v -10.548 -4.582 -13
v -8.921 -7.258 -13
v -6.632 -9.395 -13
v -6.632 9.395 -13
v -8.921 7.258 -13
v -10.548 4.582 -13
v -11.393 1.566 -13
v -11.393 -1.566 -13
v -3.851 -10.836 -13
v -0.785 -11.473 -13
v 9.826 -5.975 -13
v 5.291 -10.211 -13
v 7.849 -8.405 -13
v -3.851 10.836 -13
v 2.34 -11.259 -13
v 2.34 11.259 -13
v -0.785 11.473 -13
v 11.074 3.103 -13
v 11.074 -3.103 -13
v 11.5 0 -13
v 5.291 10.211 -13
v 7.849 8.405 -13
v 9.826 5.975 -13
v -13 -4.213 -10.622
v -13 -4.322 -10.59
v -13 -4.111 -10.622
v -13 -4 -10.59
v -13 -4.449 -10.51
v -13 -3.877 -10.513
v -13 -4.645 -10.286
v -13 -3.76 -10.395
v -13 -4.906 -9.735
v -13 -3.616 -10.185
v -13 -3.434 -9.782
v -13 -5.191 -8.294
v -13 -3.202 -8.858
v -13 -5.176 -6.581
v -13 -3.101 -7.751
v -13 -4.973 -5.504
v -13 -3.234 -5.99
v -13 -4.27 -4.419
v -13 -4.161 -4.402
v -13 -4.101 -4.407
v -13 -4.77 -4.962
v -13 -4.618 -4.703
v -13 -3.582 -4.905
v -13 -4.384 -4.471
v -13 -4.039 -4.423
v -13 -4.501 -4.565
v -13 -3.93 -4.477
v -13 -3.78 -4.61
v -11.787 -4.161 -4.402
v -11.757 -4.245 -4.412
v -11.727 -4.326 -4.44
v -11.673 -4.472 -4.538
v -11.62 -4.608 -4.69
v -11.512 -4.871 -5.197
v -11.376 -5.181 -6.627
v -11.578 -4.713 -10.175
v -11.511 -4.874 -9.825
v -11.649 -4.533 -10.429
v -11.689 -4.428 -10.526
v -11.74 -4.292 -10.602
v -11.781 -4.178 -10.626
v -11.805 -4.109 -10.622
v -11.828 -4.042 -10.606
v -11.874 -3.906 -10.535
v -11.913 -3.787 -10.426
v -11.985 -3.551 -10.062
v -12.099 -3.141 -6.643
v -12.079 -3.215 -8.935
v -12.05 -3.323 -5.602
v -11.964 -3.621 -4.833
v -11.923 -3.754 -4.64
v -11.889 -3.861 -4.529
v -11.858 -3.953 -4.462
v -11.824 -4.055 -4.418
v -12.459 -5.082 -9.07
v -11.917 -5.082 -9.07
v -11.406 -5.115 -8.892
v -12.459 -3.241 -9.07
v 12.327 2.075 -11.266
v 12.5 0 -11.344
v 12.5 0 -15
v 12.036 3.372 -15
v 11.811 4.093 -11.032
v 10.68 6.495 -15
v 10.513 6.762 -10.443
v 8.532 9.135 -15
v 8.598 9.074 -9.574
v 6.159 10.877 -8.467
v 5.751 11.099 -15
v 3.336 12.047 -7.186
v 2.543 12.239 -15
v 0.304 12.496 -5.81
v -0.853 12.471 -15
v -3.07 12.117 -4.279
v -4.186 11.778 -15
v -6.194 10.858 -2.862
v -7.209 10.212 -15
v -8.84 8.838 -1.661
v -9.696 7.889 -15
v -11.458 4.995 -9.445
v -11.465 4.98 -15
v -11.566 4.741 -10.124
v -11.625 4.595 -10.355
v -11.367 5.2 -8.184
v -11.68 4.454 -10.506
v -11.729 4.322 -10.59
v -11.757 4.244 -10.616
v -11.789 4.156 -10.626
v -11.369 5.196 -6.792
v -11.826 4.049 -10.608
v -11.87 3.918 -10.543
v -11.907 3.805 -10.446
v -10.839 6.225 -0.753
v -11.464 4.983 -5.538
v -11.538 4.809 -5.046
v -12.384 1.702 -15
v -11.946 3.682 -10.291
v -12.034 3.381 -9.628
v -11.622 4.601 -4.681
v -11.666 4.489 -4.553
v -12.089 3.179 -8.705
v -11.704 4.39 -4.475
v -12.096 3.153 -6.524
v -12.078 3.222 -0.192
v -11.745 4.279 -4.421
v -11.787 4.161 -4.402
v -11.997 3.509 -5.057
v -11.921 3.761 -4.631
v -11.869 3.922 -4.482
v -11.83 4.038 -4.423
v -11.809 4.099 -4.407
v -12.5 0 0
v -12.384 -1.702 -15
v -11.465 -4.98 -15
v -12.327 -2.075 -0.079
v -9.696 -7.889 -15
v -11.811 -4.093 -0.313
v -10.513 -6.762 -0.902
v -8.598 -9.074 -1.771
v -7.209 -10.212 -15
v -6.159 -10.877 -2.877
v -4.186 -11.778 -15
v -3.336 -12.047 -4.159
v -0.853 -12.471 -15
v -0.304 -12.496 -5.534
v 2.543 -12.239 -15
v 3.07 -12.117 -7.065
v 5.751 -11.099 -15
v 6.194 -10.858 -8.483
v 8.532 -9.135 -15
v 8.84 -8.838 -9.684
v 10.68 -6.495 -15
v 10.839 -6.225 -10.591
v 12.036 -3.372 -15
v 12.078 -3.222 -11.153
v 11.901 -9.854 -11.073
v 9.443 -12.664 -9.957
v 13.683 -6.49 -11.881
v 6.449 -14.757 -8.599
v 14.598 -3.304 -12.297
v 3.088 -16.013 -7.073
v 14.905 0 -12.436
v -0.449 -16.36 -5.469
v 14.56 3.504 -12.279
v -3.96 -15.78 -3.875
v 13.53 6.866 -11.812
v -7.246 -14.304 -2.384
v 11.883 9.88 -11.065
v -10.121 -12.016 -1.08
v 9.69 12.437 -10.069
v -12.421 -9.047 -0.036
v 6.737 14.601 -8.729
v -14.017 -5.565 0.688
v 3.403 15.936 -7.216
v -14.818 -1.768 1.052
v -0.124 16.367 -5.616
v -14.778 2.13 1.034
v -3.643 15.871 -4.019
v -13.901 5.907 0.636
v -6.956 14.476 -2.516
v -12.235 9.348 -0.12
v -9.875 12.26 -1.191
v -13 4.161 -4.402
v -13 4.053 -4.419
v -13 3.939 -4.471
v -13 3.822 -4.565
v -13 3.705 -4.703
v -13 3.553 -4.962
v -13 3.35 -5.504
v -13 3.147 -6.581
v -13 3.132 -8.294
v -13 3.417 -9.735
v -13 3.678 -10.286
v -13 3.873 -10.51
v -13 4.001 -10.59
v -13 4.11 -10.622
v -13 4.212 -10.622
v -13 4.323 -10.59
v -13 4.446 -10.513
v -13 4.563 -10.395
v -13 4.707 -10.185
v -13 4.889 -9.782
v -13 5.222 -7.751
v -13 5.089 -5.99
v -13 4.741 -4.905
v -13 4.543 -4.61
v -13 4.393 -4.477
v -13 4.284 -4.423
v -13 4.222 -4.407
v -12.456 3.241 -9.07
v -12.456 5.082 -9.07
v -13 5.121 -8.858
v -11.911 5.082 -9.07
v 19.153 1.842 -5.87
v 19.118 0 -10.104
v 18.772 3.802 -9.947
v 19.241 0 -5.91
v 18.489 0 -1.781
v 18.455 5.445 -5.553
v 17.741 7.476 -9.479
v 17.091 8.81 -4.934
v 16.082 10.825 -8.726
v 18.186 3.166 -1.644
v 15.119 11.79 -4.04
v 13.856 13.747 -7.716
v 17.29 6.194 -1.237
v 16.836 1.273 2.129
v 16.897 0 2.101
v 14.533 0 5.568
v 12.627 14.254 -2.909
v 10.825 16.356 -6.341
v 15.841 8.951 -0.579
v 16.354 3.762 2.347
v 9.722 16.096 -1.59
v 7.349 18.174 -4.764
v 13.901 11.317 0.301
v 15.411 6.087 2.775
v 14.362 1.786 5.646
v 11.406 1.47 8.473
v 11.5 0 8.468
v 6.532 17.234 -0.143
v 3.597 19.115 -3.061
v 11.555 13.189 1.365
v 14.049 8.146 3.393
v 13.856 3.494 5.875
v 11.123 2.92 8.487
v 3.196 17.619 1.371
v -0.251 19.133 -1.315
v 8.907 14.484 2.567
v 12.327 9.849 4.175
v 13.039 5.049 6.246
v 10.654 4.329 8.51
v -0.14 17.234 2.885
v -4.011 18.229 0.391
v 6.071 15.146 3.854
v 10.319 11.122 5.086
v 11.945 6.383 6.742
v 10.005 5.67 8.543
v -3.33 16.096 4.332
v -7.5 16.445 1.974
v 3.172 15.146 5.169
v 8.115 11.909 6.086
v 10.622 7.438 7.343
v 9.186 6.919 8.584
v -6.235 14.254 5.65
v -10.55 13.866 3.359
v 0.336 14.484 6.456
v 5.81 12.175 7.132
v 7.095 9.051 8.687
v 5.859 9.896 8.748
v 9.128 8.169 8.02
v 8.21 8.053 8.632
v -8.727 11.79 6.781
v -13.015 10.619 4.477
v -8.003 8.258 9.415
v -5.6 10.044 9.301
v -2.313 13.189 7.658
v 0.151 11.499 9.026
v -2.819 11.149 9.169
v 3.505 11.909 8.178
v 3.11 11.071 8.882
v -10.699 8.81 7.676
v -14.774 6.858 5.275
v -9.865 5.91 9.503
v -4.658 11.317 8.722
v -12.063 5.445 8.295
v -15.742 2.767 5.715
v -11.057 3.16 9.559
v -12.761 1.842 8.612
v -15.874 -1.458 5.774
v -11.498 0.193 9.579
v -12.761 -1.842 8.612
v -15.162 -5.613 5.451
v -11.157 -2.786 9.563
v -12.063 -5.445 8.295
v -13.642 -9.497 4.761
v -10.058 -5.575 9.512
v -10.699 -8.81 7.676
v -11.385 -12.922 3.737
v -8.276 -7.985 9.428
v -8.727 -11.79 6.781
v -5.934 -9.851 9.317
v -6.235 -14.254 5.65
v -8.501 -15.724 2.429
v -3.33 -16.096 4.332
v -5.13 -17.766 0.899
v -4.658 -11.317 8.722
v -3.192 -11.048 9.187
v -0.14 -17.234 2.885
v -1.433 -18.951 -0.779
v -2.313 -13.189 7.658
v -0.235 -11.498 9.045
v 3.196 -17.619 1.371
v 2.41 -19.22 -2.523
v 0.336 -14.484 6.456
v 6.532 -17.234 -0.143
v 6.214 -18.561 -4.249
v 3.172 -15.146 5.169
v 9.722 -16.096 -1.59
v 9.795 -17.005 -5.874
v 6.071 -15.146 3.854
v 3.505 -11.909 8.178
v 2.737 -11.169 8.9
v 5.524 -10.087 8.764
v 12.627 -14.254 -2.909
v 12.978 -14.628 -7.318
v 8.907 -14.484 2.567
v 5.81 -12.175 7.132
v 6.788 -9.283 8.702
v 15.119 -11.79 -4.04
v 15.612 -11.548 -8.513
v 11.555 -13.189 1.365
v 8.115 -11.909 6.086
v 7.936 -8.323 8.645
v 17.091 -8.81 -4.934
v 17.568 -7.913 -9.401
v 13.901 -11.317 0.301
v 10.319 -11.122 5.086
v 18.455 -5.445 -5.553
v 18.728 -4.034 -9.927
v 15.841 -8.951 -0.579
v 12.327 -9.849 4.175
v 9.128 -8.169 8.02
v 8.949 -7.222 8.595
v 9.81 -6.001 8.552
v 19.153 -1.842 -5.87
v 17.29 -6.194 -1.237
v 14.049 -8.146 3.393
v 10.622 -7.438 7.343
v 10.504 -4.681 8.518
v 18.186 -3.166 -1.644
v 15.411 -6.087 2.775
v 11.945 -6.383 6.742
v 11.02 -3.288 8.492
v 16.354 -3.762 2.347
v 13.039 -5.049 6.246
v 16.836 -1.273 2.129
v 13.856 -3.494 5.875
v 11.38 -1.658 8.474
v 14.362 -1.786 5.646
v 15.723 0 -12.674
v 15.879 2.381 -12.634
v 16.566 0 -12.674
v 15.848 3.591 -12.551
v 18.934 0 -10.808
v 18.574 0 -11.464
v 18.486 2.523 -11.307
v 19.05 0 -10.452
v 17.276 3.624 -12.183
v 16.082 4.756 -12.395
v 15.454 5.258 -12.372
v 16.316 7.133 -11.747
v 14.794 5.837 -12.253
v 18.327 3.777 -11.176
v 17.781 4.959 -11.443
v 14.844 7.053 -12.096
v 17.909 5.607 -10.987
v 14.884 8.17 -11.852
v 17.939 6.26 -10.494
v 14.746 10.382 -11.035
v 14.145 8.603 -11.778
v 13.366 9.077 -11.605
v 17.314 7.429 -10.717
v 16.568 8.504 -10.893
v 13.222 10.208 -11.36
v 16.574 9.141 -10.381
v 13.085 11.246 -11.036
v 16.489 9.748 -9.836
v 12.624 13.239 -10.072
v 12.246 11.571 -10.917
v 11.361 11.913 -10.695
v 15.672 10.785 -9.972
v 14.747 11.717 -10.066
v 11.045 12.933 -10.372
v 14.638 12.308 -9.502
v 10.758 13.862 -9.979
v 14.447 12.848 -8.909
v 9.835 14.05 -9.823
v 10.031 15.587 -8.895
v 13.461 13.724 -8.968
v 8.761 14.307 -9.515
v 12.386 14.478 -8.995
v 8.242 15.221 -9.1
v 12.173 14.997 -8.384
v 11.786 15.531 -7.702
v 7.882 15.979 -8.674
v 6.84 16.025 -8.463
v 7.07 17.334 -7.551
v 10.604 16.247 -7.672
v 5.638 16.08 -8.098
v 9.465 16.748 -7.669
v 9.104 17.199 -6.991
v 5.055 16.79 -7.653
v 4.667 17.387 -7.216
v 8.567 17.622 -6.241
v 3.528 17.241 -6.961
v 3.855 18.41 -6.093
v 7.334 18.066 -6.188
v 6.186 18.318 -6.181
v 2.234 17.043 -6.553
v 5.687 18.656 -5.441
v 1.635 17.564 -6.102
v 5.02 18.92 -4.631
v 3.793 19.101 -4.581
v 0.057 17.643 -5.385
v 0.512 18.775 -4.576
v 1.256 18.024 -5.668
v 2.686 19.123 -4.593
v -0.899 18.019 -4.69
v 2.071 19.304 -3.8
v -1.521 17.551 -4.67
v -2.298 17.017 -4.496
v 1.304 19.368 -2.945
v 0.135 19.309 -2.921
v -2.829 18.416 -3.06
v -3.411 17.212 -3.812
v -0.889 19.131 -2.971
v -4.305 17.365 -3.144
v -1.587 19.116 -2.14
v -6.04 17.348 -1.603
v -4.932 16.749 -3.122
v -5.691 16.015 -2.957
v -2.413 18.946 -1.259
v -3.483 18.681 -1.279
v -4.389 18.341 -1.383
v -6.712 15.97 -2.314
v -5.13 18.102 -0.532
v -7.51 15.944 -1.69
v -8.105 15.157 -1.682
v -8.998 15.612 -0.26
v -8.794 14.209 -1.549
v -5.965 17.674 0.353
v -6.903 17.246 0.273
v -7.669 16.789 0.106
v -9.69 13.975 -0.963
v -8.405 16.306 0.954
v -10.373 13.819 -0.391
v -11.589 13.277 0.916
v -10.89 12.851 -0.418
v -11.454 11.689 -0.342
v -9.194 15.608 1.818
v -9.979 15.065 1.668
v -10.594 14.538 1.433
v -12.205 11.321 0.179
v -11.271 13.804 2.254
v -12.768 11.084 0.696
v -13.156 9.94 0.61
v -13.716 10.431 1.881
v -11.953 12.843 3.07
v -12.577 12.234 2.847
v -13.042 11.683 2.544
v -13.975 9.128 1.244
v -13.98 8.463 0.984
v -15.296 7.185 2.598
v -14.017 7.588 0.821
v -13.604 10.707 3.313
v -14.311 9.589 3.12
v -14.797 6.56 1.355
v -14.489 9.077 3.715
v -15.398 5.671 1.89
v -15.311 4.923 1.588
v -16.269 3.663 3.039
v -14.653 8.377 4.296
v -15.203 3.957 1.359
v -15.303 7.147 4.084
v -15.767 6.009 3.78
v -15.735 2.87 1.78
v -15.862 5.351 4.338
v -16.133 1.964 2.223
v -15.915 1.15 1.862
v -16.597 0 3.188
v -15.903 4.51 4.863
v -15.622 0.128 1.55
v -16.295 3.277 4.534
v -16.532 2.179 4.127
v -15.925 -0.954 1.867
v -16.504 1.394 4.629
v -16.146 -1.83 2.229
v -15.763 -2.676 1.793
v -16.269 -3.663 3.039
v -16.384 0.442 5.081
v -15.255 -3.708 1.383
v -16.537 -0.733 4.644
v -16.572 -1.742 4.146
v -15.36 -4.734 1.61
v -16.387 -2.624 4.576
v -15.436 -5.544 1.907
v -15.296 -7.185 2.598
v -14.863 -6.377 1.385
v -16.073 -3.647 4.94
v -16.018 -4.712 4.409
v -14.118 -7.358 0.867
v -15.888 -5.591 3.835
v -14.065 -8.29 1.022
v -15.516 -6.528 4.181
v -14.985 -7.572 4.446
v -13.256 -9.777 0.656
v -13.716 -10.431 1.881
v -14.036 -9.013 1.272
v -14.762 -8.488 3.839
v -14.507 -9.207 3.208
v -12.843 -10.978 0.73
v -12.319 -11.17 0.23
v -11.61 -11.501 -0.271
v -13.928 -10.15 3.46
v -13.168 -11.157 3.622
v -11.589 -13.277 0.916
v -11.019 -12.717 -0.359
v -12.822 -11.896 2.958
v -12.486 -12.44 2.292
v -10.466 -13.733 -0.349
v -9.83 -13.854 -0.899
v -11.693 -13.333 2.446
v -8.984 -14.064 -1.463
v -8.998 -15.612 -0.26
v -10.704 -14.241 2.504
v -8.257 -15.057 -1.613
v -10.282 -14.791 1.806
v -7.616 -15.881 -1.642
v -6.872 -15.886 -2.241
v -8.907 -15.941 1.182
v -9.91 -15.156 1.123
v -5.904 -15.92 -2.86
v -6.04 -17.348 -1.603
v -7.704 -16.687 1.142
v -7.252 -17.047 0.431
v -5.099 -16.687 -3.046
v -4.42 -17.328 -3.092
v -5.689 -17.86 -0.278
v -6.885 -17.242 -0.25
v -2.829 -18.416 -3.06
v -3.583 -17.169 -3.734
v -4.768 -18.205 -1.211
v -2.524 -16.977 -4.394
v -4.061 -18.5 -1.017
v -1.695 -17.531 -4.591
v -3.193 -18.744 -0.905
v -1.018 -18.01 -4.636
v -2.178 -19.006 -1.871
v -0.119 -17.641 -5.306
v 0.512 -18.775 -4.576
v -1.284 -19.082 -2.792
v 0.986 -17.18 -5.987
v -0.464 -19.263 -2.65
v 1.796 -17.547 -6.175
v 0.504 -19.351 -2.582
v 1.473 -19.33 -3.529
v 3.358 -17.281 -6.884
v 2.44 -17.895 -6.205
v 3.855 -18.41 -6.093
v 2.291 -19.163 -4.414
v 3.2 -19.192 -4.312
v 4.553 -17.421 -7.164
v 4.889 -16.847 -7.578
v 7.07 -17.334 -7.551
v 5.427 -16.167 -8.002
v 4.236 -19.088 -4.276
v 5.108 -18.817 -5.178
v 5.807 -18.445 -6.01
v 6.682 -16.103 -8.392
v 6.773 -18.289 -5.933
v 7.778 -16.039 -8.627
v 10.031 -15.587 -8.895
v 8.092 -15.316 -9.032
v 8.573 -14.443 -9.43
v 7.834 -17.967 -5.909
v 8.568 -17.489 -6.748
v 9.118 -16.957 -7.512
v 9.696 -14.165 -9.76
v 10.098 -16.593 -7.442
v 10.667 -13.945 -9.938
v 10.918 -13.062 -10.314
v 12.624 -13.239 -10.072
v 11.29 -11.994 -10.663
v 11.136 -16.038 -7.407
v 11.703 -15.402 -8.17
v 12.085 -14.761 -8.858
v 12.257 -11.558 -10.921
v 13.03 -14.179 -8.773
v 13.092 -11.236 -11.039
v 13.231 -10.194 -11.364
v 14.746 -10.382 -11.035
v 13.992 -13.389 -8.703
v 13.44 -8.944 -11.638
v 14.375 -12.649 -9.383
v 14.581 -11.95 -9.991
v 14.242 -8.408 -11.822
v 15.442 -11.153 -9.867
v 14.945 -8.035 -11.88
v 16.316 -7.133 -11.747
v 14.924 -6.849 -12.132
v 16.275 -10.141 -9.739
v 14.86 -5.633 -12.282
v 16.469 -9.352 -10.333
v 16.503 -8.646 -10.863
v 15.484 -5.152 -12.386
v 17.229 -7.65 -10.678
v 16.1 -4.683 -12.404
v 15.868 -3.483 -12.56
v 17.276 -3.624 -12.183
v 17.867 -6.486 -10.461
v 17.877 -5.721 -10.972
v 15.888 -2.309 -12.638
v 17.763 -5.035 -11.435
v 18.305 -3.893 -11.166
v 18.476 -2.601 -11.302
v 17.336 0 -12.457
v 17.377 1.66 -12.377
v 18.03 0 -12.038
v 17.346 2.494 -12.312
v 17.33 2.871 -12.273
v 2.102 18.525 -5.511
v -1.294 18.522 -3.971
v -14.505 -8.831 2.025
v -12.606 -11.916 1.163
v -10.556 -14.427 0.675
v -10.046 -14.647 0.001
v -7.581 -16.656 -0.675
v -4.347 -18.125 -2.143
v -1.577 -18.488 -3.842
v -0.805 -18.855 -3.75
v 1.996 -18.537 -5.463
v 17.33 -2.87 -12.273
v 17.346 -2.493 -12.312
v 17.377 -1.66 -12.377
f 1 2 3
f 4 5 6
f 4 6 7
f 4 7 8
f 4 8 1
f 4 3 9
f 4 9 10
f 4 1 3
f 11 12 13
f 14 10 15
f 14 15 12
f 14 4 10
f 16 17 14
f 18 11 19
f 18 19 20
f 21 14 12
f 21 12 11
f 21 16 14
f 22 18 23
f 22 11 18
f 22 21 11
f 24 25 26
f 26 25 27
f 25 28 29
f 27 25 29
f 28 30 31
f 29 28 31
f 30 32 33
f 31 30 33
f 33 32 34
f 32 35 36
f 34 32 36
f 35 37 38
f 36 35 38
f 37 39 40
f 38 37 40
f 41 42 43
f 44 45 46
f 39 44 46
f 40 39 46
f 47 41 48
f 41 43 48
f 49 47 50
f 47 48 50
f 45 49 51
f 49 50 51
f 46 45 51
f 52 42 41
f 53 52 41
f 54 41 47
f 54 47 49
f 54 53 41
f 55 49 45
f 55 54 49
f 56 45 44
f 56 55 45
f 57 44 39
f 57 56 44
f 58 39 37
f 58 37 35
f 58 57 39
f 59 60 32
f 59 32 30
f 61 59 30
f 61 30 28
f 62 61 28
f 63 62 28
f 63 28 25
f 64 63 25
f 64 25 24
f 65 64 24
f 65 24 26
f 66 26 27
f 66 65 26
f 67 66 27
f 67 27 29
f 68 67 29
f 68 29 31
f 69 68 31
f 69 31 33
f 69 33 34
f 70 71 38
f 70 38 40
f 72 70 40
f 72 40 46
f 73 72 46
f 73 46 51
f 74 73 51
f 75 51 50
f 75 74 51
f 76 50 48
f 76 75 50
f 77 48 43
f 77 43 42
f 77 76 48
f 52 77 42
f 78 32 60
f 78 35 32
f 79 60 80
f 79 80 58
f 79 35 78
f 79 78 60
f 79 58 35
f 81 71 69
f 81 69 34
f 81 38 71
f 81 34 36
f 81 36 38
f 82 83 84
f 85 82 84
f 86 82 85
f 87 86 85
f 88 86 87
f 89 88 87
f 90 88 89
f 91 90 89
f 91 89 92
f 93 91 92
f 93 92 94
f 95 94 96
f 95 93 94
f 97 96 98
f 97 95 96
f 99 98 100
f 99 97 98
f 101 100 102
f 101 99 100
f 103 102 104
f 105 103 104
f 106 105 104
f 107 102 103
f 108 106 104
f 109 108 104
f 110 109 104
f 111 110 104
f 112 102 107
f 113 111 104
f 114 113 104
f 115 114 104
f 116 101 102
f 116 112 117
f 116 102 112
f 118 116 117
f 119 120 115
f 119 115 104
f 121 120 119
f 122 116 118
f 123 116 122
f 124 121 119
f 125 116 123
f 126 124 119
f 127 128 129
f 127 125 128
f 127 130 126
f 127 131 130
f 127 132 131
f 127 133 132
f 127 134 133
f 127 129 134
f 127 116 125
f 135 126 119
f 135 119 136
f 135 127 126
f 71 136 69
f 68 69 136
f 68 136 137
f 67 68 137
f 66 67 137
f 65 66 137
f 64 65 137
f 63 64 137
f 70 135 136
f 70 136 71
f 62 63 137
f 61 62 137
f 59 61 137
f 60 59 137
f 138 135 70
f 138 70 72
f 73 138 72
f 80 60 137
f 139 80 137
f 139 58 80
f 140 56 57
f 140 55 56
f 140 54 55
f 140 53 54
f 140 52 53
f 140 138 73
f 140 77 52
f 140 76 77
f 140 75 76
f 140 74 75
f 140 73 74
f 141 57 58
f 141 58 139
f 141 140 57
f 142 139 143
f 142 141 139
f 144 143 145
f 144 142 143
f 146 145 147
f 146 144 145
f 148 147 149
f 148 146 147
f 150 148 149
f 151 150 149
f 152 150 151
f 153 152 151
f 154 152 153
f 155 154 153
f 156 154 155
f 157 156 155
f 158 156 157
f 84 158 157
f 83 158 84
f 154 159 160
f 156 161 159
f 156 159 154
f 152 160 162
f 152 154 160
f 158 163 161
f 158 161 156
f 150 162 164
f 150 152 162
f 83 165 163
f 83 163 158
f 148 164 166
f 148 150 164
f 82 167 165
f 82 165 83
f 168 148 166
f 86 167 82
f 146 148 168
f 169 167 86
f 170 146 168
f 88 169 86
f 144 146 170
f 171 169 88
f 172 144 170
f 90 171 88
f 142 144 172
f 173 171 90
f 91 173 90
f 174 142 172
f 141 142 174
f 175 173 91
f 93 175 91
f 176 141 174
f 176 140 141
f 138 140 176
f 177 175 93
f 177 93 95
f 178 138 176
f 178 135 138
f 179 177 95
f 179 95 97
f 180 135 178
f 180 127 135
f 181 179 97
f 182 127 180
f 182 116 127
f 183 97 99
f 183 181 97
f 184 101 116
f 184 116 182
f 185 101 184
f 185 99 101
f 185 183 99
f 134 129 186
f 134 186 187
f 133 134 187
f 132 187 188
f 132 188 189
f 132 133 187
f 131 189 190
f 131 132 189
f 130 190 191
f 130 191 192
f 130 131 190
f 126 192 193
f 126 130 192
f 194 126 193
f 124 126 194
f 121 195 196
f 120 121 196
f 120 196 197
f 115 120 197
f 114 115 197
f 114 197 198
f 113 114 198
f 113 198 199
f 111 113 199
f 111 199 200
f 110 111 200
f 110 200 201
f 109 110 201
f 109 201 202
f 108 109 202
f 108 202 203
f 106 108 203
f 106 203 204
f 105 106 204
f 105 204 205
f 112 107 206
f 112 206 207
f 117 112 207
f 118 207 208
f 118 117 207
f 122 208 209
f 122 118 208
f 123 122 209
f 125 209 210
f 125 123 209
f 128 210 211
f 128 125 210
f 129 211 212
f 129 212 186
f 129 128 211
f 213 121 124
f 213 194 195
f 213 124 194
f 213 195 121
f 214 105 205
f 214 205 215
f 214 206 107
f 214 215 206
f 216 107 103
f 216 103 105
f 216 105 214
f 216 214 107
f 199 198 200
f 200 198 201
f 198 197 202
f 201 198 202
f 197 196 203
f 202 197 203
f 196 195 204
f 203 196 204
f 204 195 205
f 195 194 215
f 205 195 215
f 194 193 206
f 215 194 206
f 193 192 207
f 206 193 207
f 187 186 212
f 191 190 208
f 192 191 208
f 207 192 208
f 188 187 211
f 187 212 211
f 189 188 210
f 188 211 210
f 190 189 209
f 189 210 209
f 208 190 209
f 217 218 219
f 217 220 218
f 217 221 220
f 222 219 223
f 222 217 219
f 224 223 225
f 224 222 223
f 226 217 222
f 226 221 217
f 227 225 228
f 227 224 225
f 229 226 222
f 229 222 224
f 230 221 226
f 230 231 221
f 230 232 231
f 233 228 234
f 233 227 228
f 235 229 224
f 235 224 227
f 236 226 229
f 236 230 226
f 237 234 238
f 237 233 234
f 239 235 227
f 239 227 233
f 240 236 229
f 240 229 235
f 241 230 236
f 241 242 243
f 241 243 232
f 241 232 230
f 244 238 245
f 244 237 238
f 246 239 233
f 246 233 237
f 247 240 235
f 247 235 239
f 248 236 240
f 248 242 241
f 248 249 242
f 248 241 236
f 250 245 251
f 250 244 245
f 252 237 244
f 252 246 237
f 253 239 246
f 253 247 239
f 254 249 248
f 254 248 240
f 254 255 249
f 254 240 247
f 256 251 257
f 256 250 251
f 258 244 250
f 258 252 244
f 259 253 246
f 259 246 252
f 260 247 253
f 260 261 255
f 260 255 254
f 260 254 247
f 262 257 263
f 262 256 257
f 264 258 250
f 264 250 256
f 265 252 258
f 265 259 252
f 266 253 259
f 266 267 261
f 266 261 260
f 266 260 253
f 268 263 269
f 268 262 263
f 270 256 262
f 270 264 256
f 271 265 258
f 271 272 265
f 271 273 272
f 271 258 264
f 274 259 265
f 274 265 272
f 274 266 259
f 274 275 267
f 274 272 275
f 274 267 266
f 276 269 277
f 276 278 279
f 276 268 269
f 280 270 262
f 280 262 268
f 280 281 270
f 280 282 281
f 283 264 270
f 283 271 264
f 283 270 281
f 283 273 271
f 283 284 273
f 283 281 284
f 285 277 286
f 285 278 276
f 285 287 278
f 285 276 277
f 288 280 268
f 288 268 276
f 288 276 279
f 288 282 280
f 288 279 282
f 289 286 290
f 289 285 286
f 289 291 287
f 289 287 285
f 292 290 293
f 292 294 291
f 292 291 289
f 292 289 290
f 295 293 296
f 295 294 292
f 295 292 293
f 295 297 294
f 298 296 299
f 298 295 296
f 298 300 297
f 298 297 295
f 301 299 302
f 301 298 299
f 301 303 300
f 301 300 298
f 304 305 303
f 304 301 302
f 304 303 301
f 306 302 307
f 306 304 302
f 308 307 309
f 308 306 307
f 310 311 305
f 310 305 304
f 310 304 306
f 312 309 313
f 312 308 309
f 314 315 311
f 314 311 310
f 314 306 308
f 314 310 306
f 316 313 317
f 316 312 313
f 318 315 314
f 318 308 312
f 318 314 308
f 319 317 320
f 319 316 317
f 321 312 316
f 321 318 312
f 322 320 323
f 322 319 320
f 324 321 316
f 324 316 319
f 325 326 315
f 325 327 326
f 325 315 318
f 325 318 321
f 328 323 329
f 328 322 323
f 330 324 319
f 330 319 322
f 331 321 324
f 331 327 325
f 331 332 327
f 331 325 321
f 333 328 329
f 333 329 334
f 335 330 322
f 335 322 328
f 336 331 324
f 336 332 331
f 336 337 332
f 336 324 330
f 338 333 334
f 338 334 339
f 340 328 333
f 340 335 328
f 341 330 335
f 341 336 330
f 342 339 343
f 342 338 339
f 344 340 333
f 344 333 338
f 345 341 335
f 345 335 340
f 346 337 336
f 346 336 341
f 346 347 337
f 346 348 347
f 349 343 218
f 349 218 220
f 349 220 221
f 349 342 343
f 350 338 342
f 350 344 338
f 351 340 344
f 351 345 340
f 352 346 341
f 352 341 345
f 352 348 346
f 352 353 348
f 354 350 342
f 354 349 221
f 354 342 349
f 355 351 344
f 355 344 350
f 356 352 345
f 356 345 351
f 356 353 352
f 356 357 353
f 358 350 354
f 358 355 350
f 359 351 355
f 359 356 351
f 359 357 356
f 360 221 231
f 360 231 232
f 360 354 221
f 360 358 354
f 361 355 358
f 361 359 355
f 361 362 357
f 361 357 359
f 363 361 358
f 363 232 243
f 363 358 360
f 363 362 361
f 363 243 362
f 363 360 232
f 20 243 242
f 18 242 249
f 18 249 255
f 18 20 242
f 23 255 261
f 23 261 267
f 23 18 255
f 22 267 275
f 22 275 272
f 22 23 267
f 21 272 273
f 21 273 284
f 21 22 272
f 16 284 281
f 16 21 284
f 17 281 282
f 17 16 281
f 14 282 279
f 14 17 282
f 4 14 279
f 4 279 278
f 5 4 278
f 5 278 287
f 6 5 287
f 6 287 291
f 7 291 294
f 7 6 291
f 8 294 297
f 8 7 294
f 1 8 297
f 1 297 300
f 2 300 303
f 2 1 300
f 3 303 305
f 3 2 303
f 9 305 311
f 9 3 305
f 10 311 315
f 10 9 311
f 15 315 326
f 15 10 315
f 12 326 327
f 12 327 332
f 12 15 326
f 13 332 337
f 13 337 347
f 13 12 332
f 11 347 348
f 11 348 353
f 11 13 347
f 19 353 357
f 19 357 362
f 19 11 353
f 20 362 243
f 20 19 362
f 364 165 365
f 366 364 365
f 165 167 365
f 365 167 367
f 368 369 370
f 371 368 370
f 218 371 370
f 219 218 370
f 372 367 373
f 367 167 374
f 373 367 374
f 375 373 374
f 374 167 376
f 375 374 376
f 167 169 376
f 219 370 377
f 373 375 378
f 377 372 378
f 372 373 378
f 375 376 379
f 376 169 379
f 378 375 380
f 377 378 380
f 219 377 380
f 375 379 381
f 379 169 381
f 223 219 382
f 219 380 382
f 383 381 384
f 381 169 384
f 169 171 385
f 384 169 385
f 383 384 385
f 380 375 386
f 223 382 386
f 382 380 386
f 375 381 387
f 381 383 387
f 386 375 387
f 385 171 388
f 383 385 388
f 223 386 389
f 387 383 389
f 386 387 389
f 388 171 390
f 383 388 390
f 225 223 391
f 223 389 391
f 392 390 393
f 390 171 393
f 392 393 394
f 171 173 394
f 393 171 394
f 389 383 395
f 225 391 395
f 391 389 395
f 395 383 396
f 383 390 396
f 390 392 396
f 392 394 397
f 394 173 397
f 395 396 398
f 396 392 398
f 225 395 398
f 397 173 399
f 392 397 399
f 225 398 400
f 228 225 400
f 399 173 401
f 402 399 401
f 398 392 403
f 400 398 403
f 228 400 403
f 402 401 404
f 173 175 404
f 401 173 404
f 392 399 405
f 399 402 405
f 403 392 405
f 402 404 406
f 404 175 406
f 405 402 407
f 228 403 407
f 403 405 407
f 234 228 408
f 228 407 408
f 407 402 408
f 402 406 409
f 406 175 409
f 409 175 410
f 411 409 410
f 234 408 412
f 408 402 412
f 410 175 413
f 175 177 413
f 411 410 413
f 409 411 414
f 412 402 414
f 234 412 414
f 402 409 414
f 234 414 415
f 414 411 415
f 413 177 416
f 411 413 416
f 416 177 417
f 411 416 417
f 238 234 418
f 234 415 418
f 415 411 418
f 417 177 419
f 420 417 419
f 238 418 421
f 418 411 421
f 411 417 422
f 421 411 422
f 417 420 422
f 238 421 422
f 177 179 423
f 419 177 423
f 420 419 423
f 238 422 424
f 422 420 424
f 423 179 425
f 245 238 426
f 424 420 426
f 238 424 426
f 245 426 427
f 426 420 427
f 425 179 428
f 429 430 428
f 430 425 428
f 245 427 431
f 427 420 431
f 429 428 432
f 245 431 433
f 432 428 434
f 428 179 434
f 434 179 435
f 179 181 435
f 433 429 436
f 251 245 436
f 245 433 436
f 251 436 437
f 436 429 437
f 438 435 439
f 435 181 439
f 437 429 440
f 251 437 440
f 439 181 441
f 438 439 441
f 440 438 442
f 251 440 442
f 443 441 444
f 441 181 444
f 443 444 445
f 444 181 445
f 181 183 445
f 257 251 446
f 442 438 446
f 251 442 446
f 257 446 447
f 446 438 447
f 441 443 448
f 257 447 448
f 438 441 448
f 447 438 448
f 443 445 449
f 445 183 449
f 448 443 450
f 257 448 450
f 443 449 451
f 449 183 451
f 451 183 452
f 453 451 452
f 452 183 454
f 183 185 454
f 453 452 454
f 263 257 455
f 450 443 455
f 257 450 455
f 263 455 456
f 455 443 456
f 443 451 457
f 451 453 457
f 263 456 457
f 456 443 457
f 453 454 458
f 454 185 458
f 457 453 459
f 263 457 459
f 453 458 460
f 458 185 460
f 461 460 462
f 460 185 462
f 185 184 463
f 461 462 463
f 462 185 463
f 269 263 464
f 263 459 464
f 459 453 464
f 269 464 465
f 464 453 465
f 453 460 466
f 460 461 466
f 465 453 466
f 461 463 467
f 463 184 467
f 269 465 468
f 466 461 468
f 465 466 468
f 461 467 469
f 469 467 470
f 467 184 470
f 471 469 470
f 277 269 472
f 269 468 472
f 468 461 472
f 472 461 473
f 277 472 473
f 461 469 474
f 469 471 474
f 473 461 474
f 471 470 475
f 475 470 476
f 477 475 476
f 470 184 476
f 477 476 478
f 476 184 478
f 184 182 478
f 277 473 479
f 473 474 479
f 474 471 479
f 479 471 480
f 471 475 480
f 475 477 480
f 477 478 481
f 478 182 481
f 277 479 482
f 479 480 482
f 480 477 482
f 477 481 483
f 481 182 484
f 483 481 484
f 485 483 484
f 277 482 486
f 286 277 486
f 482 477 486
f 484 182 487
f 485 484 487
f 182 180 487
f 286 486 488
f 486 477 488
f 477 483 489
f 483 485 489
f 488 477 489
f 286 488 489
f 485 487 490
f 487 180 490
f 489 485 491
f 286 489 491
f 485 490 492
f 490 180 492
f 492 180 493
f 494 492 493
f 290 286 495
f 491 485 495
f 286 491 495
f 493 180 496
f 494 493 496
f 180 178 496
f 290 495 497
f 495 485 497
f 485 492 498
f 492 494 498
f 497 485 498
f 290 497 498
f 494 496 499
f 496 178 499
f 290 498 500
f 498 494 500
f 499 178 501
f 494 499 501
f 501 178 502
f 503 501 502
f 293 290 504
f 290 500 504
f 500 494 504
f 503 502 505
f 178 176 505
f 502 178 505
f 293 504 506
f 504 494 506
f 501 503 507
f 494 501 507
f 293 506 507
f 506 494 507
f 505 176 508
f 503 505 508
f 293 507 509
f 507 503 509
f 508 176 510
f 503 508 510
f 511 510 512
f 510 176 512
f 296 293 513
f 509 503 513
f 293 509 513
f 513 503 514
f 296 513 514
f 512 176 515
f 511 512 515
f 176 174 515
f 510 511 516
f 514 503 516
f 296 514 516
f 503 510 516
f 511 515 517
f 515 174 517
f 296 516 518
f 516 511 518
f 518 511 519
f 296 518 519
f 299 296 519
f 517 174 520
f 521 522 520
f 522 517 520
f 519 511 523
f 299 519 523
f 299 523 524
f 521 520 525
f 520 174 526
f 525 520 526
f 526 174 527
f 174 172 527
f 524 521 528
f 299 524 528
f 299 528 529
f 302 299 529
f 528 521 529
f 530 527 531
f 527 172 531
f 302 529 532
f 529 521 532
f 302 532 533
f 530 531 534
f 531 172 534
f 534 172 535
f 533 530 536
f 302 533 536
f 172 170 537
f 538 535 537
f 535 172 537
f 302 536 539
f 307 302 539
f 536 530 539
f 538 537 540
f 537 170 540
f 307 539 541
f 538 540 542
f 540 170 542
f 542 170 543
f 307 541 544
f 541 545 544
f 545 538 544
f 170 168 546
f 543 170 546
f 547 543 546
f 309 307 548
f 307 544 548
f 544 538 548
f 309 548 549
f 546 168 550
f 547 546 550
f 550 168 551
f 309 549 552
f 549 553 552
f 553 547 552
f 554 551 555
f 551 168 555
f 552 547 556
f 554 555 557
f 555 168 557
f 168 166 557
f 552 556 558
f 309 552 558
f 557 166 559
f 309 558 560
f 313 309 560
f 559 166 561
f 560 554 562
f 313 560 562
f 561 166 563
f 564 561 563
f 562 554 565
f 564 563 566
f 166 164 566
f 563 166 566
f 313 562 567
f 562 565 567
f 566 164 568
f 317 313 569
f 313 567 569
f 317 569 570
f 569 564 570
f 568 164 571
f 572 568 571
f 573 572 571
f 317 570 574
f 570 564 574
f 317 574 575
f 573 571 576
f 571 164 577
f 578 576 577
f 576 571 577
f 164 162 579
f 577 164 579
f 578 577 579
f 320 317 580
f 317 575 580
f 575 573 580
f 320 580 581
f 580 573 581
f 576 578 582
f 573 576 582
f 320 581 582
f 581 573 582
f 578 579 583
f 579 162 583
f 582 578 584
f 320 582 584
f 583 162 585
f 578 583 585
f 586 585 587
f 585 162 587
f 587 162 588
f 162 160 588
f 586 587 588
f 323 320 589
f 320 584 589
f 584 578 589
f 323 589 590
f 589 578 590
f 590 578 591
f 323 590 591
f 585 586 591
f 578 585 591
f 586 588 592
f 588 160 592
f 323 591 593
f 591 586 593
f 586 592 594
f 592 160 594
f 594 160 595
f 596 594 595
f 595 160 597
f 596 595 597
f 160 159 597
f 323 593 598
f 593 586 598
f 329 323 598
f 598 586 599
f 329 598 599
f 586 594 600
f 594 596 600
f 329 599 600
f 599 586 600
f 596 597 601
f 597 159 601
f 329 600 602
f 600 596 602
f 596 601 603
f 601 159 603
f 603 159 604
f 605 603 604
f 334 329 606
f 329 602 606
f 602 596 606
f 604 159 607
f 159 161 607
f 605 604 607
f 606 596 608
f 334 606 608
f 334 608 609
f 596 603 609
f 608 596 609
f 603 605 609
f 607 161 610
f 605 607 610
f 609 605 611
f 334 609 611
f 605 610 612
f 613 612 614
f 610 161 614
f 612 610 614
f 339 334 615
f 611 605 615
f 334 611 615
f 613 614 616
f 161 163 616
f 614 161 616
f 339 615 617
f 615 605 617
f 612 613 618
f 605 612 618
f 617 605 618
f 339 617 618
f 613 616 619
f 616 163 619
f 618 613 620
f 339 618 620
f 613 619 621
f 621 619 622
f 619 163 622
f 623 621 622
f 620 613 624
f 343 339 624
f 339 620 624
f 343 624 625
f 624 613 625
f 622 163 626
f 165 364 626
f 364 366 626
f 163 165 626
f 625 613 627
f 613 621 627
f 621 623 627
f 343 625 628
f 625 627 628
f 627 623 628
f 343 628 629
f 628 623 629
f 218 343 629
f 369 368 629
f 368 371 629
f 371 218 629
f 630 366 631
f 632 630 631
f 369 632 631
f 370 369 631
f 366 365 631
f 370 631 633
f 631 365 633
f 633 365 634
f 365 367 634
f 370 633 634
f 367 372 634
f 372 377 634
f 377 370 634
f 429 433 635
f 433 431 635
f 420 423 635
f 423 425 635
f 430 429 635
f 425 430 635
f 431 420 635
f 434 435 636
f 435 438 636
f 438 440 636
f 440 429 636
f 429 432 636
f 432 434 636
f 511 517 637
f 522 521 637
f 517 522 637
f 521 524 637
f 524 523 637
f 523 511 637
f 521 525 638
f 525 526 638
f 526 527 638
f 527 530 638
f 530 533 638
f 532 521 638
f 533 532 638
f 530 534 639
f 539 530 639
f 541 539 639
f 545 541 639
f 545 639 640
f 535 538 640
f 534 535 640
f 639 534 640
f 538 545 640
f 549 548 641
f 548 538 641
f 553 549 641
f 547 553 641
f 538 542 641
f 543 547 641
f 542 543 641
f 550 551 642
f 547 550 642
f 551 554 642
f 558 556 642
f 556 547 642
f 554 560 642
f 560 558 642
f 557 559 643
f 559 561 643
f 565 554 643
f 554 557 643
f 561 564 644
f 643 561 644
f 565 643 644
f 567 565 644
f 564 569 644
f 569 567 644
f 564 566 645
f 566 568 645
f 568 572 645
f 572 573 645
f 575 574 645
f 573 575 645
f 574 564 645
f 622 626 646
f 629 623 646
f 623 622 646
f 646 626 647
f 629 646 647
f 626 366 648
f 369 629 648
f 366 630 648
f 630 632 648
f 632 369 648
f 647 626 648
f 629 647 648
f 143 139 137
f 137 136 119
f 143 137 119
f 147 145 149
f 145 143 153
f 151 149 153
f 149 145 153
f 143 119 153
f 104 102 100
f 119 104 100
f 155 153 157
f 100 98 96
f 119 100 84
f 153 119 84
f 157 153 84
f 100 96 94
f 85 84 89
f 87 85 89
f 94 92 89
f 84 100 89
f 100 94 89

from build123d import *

# Parameters (mm, degrees)
F0_R      = 12.5
F1_DEPTH  = 15
F3_DEPTH  = 15
F5_DEPTH  = 13
F10_R     = 3
F11_R     = 11.5
F12_DEPTH = 12.6699203183
F14_R     = 11.5
F15_DEPTH = 13


with BuildPart() as f1:
    # F0 (on Top) → F1 (new body)
    with BuildSketch(Plane.XY):
        Circle(F0_R)
    extrude(amount=-F1_DEPTH)

    # F2 (on Front) → F3 (cut, symmetric)
    with BuildSketch(Plane.XZ):
        Polygon((12.5, 0), (-12.5, 0), (12.5, -11.3443713635), align=None)
    extrude(amount=F3_DEPTH, both=True, mode=Mode.SUBTRACT)

    # F4 (on Right) → F5 (join)
    with BuildSketch(Plane.YZ):
        with BuildLine():
            add(Edge.make_bspline(
                [(4.1614882648, -4.4021867216), (2.3196844094, -4.4021867216), (3.2405863371, -9.0699917637), (4.1614882648, -13.7377968058), (5.0823901925, -9.0699917637), (6.0032921202, -4.4021867216), (4.1614882648, -4.4021867216)],
                knots=[0, 0, 0, 2.0943951024, 2.0943951024, 4.1887902048, 4.1887902048, 6.2831853072, 6.2831853072, 6.2831853072], degree=2, weights=[1, 0.5, 1, 0.5, 1, 0.5, 1]))
        make_face()
        with BuildLine():
            add(Edge.make_bspline(
                [(-4.1614882648, -4.4021867216), (-6.0032921202, -4.4021867216), (-5.0823901925, -9.0699917637), (-4.1614882648, -13.7377968058), (-3.2405863371, -9.0699917637), (-2.3196844094, -4.4021867216), (-4.1614882648, -4.4021867216)],
                knots=[0, 0, 0, 2.0943951024, 2.0943951024, 4.1887902048, 4.1887902048, 6.2831853072, 6.2831853072, 6.2831853072], degree=2, weights=[1, 0.5, 1, 0.5, 1, 0.5, 1]))
        make_face()
    extrude(amount=-F5_DEPTH)

    # F8 (on Front) → F9 (revolve)
    with BuildSketch(Plane.XZ):
        with BuildLine():
            Line((0, -5.6721856818), (18.2126128557, -13.9366114312))
            ThreePointArc((18.2126128557, -13.9366114312), (17.6536526203, 0.5365345313), (7.5079209485, 10.8732902815))
            Line((7.5079209485, 10.8732902815), (0, -5.6721856818))
        make_face()
    revolve(axis=Axis((3.7539604743, 0, 2.6005522999), (0.4132212875, 0, 0.9106306428)))

    # F10
    f10_edges = [f1.edges().sort_by_distance(p)[0] for p in [
        (-18.212613, 0, 2.59224),
    ]]
    fillet(f10_edges, radius=F10_R)

    # F11 (on Top) → F12 (cut, through all)
    with BuildSketch(Plane.XY):
        Circle(F11_R)
    extrude(amount=F12_DEPTH, mode=Mode.SUBTRACT)

    # F14 (on face) → F15 (cut)
    with BuildSketch(Plane.XY):
        Circle(F14_R)
    extrude(amount=-F15_DEPTH, mode=Mode.SUBTRACT)


solid = f1.part
